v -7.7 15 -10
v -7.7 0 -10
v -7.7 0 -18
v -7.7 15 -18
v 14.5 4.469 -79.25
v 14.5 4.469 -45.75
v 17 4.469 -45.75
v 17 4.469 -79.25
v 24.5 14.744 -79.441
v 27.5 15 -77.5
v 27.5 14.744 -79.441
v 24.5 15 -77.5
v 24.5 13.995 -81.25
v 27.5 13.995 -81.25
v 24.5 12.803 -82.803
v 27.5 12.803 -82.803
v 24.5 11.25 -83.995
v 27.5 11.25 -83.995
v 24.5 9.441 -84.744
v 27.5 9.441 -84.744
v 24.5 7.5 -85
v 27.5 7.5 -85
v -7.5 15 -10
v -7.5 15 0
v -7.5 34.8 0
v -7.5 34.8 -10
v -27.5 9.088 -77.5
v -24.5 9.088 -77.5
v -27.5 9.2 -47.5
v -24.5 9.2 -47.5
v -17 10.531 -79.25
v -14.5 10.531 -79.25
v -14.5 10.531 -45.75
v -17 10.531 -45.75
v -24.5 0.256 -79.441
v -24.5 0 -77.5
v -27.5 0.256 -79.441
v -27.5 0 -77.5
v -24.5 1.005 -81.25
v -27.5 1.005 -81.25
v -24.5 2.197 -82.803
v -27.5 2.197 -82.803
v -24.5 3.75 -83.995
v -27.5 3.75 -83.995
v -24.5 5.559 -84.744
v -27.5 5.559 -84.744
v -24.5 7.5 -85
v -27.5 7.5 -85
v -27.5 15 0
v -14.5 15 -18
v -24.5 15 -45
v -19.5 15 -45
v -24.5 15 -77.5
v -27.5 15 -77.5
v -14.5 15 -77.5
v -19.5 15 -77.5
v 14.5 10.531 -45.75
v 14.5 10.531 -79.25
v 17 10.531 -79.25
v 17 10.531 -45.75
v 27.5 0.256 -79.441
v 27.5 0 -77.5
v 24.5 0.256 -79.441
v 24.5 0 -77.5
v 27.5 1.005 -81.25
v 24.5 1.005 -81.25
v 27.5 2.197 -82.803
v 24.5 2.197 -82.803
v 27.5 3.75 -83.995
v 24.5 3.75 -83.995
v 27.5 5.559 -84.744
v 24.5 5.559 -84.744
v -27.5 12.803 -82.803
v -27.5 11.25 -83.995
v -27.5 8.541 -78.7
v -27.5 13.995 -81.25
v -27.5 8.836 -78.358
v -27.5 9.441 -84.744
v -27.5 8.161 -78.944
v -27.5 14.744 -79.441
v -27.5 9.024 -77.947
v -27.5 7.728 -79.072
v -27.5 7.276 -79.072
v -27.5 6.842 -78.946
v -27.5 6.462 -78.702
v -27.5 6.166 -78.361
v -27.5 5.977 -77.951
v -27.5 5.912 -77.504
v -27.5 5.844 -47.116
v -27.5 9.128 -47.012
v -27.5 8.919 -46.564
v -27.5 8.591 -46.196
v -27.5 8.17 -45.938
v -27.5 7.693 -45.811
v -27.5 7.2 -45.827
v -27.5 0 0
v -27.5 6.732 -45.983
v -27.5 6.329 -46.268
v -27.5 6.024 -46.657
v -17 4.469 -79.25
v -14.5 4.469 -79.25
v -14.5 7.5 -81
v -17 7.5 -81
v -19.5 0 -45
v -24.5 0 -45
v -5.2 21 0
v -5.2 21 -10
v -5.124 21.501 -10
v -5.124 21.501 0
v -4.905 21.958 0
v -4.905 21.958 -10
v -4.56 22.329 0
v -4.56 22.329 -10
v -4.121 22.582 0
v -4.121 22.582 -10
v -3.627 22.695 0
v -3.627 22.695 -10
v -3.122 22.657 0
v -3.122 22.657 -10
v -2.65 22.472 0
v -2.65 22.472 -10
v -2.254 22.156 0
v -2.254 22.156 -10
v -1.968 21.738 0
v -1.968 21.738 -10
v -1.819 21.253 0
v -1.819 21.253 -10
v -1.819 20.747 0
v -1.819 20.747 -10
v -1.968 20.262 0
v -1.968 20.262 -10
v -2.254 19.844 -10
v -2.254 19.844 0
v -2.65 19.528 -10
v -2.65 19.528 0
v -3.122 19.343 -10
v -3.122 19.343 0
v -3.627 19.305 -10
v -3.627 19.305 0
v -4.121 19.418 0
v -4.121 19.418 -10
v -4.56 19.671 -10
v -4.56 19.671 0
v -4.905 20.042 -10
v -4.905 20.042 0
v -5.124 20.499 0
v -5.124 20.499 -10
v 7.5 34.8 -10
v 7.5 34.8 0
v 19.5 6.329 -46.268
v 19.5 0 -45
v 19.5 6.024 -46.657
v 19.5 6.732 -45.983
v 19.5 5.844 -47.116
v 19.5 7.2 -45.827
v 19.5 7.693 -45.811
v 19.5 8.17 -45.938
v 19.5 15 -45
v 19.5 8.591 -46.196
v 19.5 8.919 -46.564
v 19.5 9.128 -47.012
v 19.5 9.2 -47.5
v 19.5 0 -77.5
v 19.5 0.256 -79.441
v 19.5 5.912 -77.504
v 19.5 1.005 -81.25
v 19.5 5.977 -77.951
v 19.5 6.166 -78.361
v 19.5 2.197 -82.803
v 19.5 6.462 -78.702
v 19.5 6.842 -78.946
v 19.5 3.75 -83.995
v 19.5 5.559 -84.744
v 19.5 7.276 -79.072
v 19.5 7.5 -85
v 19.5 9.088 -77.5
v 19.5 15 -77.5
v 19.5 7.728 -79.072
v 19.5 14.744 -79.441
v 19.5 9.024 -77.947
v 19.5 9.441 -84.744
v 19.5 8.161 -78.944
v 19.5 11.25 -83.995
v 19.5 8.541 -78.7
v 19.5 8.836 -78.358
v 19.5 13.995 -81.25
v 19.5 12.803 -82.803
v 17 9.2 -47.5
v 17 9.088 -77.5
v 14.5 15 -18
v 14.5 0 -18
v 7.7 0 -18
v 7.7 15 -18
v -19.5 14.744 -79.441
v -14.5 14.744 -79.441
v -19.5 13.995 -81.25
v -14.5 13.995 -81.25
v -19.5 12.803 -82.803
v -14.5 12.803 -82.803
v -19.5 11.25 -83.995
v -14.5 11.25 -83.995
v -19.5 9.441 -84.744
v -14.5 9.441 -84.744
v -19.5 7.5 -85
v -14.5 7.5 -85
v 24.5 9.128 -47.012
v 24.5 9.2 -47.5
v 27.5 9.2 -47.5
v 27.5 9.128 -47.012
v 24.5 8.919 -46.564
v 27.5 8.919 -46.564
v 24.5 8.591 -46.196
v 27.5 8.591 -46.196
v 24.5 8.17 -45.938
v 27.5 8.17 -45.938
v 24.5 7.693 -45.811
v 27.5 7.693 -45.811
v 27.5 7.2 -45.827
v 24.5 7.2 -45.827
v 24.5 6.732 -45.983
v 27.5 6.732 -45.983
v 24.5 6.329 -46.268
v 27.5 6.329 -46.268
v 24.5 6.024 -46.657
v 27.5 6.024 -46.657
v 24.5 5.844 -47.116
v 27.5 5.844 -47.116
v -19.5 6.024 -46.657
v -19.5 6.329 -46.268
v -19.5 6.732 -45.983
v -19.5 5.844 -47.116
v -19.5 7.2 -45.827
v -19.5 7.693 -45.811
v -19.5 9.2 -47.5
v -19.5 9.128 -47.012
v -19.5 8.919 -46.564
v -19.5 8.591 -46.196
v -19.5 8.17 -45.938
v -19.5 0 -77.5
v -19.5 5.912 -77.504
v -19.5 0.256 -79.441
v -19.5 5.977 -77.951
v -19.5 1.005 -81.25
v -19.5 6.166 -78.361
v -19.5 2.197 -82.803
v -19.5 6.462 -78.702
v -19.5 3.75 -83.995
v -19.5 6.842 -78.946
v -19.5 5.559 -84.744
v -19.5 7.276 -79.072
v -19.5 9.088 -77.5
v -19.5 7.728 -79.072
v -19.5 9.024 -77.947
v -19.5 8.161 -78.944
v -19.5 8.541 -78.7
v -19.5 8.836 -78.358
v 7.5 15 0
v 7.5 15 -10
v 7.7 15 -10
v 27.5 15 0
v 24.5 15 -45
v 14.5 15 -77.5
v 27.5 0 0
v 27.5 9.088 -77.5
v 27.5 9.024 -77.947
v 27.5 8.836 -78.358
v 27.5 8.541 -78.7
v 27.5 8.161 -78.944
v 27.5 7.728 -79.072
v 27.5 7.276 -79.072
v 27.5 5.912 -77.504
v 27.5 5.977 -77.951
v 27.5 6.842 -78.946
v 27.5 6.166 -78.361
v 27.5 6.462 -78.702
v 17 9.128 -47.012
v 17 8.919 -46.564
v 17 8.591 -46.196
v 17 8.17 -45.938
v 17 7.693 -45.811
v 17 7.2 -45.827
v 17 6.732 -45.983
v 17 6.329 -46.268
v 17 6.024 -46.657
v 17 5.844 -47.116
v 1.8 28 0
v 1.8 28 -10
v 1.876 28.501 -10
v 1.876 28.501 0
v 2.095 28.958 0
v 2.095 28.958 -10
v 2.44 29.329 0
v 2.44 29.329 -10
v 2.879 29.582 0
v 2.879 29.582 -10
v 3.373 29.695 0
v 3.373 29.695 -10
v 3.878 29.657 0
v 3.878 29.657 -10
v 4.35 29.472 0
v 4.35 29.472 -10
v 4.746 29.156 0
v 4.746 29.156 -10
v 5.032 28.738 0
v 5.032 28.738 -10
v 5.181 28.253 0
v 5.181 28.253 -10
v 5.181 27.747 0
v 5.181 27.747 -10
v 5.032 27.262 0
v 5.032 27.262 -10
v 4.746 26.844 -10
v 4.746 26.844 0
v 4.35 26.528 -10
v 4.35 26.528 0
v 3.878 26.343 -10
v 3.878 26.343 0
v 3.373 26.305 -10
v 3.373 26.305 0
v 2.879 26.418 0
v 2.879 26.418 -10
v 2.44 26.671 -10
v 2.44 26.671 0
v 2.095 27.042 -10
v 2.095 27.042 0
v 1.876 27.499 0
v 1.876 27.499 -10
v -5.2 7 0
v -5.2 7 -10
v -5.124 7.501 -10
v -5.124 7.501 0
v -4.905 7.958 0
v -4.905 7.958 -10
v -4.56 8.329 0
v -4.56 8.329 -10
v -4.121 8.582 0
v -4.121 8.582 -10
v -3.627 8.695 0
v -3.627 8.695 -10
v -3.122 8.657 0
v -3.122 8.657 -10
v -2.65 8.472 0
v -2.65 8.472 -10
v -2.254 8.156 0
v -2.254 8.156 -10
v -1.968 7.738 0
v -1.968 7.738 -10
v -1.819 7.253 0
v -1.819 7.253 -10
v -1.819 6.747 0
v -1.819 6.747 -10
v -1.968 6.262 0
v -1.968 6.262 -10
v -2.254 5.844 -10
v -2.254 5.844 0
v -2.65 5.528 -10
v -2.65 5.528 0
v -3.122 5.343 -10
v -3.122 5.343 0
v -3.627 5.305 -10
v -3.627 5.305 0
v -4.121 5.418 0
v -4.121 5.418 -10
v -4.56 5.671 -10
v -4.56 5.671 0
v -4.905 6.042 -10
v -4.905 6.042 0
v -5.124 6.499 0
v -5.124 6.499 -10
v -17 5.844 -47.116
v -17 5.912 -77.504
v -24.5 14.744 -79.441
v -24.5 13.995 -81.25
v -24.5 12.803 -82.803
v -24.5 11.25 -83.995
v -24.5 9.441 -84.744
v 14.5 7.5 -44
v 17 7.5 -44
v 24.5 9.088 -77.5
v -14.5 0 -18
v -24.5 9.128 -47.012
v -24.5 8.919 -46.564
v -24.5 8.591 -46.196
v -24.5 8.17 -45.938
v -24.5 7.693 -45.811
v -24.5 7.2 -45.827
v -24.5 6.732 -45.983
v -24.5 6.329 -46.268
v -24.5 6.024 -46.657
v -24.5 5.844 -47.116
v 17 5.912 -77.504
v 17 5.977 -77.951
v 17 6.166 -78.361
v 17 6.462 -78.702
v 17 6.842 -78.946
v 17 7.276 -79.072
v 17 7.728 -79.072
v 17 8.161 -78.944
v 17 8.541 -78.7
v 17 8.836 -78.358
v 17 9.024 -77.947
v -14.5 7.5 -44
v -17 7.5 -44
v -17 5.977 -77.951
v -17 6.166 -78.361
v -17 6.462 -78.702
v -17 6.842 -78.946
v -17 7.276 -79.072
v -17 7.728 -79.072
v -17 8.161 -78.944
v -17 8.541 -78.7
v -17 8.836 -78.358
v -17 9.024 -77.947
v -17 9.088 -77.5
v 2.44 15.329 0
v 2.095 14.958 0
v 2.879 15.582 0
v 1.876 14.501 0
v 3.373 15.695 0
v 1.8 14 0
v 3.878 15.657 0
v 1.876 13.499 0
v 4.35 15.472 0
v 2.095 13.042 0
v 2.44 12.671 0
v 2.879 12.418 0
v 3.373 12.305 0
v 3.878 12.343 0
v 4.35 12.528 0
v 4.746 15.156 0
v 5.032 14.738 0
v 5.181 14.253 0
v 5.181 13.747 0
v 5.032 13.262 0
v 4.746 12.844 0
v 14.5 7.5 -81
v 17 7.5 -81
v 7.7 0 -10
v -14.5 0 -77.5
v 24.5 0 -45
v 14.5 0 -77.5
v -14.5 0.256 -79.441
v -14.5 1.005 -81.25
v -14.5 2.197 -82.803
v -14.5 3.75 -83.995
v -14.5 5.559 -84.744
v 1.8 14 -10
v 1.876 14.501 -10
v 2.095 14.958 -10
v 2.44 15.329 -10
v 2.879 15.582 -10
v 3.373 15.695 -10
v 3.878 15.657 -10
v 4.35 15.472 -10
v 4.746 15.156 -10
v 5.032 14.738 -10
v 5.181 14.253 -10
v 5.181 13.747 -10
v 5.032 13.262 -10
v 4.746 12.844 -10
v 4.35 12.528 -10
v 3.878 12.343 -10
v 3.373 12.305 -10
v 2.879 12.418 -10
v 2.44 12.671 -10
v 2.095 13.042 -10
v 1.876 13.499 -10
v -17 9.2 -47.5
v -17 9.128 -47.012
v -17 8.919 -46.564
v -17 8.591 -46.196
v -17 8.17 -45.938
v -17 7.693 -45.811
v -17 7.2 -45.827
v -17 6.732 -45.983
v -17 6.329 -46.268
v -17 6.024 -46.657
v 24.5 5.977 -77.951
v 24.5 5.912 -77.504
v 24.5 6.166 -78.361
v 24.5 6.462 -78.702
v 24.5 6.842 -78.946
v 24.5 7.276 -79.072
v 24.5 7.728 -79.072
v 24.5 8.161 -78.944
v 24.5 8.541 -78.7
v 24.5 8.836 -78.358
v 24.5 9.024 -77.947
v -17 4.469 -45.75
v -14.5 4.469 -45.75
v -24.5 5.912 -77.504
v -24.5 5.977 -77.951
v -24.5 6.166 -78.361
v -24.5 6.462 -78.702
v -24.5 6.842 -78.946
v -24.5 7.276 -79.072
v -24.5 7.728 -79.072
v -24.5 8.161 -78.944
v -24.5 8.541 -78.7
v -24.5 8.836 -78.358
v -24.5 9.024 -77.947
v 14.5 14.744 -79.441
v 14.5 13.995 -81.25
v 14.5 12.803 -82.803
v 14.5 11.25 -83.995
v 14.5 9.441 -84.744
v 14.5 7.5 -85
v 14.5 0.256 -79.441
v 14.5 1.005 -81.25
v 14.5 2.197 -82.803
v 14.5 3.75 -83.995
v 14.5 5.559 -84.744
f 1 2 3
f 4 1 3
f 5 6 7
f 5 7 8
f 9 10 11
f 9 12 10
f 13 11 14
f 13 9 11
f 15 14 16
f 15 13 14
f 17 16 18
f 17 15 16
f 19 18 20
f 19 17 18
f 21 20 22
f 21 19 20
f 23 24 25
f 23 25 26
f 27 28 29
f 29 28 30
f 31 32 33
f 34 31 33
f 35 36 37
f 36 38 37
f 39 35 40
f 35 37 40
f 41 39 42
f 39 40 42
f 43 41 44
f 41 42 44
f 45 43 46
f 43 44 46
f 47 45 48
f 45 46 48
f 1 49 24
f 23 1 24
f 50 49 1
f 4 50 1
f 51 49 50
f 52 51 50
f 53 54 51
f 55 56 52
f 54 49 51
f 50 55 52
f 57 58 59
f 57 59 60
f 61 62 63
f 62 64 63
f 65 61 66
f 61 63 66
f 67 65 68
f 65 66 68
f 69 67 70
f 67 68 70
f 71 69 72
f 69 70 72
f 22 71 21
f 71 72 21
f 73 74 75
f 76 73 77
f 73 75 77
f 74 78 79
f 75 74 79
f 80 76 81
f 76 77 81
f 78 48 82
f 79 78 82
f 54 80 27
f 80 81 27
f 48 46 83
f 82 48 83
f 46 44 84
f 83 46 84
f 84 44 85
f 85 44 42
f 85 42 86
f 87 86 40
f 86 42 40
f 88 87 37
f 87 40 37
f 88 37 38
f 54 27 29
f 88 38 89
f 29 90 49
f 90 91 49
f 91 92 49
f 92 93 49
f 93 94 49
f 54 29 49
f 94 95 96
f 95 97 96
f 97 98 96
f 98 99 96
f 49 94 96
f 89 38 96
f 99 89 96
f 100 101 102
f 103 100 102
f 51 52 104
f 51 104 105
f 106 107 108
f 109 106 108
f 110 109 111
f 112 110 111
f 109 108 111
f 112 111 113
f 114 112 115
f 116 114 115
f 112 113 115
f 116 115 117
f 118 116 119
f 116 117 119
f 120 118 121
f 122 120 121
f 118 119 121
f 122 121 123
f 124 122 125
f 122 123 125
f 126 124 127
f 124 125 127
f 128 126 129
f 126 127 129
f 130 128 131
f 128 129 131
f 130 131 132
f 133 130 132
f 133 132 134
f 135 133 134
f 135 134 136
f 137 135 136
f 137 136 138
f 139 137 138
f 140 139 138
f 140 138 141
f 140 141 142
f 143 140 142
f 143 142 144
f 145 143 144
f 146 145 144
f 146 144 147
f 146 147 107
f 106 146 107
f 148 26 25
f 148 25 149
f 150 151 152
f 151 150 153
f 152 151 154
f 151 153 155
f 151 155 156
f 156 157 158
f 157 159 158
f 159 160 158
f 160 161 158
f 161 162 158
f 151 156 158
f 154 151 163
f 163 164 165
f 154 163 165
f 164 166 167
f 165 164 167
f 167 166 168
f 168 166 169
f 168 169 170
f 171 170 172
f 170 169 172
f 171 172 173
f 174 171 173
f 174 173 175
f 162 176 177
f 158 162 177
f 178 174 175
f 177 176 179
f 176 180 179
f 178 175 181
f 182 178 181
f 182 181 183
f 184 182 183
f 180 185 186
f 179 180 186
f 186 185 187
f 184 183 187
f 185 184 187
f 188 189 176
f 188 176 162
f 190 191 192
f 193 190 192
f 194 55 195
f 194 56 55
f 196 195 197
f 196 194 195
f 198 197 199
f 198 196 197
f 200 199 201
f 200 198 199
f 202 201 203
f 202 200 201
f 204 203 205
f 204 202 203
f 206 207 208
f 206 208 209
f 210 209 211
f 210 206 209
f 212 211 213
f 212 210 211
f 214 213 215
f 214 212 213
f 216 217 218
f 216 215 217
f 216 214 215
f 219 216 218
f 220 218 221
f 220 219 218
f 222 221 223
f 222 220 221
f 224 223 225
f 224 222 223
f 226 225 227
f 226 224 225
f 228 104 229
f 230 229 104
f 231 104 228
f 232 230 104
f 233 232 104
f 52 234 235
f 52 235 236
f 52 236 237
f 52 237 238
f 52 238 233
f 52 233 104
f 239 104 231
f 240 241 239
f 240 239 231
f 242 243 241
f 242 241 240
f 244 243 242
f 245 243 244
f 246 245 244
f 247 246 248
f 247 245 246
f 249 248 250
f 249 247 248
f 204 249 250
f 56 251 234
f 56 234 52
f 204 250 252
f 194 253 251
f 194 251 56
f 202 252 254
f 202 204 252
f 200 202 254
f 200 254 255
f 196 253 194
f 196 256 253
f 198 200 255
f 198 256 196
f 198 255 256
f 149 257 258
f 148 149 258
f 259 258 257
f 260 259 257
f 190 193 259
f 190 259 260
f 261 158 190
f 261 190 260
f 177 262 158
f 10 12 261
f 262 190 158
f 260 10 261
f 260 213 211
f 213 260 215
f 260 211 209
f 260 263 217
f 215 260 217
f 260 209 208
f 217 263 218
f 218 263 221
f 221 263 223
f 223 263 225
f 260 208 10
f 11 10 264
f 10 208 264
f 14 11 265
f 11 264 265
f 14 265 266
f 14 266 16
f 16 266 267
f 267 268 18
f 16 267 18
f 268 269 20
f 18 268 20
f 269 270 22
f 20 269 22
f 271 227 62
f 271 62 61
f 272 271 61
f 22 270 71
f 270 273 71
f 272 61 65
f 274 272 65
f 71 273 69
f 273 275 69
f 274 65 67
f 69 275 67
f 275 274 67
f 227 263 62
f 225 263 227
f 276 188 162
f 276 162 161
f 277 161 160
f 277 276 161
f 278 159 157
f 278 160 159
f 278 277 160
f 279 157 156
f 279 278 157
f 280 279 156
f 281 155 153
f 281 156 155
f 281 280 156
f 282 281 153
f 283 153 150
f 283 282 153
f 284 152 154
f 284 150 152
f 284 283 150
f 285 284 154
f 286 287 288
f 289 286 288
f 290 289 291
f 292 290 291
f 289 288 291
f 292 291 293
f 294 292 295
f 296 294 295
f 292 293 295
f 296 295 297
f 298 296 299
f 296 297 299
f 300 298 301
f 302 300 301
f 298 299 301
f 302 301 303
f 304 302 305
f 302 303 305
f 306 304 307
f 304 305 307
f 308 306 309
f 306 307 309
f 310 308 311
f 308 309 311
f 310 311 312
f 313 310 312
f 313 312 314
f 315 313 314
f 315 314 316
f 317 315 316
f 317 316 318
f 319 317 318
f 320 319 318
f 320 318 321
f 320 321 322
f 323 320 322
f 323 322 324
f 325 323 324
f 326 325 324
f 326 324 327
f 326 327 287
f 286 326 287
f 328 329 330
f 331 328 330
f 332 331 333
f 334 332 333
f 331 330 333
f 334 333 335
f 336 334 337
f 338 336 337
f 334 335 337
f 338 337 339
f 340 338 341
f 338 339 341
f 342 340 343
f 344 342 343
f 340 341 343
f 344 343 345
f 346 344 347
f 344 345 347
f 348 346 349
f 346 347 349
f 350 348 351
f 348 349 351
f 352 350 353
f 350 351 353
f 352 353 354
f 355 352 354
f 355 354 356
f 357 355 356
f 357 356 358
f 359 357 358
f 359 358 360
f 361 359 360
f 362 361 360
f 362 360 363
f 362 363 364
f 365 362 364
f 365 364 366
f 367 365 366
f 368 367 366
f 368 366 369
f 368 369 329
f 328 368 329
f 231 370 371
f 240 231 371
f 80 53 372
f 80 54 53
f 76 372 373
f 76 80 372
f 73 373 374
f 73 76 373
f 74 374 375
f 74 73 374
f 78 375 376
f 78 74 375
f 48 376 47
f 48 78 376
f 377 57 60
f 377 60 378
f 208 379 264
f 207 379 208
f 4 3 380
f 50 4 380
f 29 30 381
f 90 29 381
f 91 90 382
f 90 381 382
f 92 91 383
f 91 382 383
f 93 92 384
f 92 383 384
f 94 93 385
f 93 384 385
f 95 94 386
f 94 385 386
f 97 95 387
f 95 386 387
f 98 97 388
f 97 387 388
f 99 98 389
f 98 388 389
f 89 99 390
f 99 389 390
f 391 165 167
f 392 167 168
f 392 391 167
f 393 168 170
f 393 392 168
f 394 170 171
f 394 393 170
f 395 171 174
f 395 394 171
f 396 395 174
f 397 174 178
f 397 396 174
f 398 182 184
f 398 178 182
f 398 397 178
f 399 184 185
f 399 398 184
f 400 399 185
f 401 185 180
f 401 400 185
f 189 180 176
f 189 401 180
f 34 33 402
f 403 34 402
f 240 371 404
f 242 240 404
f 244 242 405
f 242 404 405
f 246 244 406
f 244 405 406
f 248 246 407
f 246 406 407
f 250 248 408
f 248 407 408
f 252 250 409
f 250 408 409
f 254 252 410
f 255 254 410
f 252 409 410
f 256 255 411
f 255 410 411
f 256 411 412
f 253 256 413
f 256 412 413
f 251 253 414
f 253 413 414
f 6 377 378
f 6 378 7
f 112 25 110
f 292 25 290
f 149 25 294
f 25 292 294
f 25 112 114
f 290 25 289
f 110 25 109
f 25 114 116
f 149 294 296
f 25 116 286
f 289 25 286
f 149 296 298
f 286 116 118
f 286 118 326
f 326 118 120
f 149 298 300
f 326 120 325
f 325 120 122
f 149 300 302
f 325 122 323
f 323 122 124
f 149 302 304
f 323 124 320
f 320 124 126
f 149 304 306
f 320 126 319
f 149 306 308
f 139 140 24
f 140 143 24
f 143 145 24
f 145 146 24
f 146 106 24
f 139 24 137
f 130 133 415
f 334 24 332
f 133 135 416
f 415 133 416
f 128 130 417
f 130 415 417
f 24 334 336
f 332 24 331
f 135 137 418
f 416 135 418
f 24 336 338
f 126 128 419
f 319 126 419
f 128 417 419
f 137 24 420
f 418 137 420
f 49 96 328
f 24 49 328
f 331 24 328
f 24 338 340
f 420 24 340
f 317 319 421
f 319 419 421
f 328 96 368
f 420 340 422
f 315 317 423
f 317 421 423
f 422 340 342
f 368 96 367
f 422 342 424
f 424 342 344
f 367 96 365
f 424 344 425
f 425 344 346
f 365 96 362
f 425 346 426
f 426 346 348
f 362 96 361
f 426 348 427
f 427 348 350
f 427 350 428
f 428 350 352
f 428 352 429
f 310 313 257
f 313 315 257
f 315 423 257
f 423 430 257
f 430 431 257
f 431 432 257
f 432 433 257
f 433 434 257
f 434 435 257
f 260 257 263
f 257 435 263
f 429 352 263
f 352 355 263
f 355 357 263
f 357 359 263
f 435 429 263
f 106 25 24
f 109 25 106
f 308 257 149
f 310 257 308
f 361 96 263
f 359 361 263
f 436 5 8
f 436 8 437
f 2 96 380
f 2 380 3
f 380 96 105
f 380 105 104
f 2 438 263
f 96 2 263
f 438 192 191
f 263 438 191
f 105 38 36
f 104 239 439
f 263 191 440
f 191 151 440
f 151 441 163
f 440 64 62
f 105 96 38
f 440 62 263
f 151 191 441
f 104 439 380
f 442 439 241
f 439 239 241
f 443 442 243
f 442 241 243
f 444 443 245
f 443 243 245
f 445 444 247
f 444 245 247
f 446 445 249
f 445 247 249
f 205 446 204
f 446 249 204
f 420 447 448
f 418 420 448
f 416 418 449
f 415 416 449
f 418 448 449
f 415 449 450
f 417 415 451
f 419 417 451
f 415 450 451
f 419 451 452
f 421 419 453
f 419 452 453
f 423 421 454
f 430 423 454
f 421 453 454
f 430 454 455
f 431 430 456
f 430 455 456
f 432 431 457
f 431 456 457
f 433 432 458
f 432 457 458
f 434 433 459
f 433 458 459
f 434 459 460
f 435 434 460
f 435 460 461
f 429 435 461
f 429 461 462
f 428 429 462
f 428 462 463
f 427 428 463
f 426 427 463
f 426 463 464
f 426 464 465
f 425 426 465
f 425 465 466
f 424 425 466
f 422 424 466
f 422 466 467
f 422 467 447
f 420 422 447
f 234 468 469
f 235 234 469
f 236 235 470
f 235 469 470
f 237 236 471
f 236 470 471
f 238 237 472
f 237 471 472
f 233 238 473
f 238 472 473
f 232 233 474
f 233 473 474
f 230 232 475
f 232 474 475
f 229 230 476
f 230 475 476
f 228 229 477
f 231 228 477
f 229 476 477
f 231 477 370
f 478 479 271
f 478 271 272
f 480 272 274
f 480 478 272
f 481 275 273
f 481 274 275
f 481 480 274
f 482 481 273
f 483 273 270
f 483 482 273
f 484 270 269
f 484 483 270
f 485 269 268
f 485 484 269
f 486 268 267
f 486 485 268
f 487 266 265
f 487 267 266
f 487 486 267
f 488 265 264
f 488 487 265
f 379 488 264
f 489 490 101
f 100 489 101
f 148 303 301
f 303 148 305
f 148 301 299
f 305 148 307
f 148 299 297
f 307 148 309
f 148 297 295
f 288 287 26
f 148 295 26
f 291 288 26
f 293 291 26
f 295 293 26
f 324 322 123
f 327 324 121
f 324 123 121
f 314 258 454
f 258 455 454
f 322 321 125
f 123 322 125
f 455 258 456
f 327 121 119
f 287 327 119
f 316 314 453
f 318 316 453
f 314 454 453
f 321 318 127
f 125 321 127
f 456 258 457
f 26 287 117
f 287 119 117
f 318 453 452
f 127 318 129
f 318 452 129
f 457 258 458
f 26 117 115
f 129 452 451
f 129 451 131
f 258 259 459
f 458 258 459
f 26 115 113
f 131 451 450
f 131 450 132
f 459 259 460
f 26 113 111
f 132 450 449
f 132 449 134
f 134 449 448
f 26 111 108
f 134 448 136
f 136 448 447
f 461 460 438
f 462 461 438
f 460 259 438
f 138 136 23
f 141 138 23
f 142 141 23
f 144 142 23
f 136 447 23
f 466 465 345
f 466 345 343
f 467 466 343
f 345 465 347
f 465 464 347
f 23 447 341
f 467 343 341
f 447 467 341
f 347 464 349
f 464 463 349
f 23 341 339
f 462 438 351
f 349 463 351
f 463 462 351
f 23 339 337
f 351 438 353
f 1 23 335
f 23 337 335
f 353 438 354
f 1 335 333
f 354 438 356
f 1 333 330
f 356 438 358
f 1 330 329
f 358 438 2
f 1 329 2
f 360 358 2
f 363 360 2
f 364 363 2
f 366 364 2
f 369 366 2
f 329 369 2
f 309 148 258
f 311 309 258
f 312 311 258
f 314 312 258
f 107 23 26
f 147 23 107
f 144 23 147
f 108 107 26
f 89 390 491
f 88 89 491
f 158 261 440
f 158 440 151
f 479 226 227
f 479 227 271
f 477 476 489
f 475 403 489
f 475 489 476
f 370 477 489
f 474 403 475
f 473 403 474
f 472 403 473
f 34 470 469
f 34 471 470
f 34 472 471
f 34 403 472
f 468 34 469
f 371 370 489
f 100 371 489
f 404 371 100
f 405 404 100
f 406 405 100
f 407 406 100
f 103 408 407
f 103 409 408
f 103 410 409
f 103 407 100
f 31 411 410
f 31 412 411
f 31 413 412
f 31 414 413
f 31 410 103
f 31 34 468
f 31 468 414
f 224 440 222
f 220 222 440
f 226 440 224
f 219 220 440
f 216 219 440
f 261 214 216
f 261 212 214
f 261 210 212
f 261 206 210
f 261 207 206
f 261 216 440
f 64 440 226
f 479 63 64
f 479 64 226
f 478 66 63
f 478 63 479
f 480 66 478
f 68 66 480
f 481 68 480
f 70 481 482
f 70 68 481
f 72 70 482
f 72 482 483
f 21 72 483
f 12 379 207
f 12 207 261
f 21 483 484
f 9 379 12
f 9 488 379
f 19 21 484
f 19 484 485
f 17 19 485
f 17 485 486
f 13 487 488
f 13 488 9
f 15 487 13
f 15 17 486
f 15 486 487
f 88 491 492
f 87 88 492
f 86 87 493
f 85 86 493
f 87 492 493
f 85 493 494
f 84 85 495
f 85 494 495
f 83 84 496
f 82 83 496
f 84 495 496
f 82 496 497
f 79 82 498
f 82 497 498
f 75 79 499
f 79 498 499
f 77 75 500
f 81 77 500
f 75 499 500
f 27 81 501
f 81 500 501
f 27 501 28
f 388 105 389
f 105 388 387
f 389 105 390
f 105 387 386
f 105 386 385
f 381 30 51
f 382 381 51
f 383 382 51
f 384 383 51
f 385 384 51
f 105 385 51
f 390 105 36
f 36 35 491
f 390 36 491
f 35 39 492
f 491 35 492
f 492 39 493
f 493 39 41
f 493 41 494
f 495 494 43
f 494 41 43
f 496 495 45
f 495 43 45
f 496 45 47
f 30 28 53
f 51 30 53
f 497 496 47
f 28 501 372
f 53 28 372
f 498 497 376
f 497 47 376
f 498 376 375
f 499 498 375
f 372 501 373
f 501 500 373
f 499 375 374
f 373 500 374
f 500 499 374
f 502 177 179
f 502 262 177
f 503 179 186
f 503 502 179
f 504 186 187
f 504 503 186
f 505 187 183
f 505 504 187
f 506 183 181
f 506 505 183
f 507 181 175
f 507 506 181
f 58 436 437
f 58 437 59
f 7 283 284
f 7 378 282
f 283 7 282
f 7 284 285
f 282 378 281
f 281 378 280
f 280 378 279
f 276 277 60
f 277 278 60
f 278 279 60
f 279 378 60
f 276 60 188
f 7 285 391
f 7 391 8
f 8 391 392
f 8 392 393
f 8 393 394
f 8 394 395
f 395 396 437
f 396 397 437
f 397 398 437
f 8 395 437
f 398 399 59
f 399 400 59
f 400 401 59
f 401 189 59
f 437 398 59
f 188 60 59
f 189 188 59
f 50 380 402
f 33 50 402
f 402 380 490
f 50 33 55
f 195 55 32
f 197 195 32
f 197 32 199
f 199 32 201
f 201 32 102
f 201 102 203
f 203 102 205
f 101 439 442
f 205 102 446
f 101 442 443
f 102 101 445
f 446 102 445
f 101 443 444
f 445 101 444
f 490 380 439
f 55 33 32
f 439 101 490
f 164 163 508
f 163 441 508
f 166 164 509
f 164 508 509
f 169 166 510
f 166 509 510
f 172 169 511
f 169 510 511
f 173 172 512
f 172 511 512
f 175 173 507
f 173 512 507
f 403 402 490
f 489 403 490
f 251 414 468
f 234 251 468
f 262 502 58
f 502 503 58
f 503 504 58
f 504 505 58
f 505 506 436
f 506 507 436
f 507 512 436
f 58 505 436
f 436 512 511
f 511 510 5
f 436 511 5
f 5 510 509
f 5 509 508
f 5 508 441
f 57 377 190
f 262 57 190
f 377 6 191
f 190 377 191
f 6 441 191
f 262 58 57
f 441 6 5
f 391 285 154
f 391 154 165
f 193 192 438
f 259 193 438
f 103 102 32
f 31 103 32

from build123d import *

# Parameters (mm, degrees)
BOSS_EXTRUDE1_DEPTH = 15
SKETCH2_W           = 15
SKETCH2_H           = 10
BOSS_EXTRUDE2_DEPTH = 19.8
SKETCH3_W           = 5
SKETCH3_H           = 15
CUT_EXTRUDE1_DEPTH  = 40
CUT_EXTRUDE2_REACH  = 89.134
SKETCH4_R           = 1.7
LPATTERN1_COUNT     = 2
LPATTERN1_PITCH     = 14
CUT_EXTRUDE3_DEPTH  = 2.5
CUT_EXTRUDE4_DEPTH  = 15
FILLET1_R           = 7.5


with BuildPart() as part:
    # Sketch1 → Boss-Extrude1 (new body)
    with BuildSketch(Plane(origin=(0, 0, 0), x_dir=(1, 0, 0), z_dir=(0, 1, 0))):
        Polygon((-27.5, 0), (27.5, 0), (27.5, 85), (14.5, 85), (14.5, 18), (7.7, 18), (7.7, 10), (-7.7, 10), (-7.7, 18), (-14.5, 18), (-14.5, 85), (-27.5, 85), align=None)
    extrude(amount=BOSS_EXTRUDE1_DEPTH)

    # Sketch2 → Boss-Extrude2 (add)
    with BuildSketch(Plane(origin=(0, 15, 0), x_dir=(1, 0, 0), z_dir=(0, 1, 0))):
        with Locations((0, 5)):
            Rectangle(SKETCH2_W, SKETCH2_H)
    extrude(amount=BOSS_EXTRUDE2_DEPTH)

    # Sketch3 → Cut-Extrude1 (cut)
    with BuildSketch(Plane(origin=(0, 0, -85), x_dir=(-1, 0, 0), z_dir=(0, 0, -1))):
        with Locations((22, 7.5)):
            Rectangle(SKETCH3_W, SKETCH3_H)
        with Locations((-22, 7.5)):
            Rectangle(SKETCH3_W, SKETCH3_H)
    extrude(amount=-CUT_EXTRUDE1_DEPTH, mode=Mode.SUBTRACT)

    # Sketch4 → Cut-Extrude2 (cut, up to next)
    with BuildSketch(Plane(origin=(0, 0, -10), x_dir=(-1, 0, 0), z_dir=(0, 0, -1)), mode=Mode.PRIVATE) as cut_extrude2_sk1:
        with Locations((-3.5, 28)):
            Circle(SKETCH4_R)
    cut_extrude2_tool1 = extrude(cut_extrude2_sk1.sketch, amount=-CUT_EXTRUDE2_REACH, mode=Mode.PRIVATE) & part.part
    # Sketch4 → Cut-Extrude2 (cut, up to next)
    with BuildSketch(Plane(origin=(0, 0, -10), x_dir=(-1, 0, 0), z_dir=(0, 0, -1)), mode=Mode.PRIVATE) as cut_extrude2_sk2:
        with Locations((3.5, 21)):
            Circle(SKETCH4_R)
    cut_extrude2_tool2 = extrude(cut_extrude2_sk2.sketch, amount=-CUT_EXTRUDE2_REACH, mode=Mode.PRIVATE) & part.part
    cut_extrude2_1 = cut_extrude2_tool1.solids().sort_by_distance((3.5, 28, -10))[0]
    add(cut_extrude2_1, mode=Mode.SUBTRACT)
    cut_extrude2_2 = cut_extrude2_tool2.solids().sort_by_distance((-3.5, 21, -10))[0]
    add(cut_extrude2_2, mode=Mode.SUBTRACT)
    cut_extrude2 = cut_extrude2_1 + cut_extrude2_2  # Cut-Extrude2 as one shape, for the pattern or mirror that repeats it

    # LPattern1: Cut-Extrude2 ×2
    with Locations(*[(0, -i * LPATTERN1_PITCH, 0) for i in range(1, LPATTERN1_COUNT)]):
        add(cut_extrude2, mode=Mode.SUBTRACT)

    # Sketch5 → Cut-Extrude3 (cut)
    with BuildSketch(Plane.ZY.offset(-14.5)):
        Polygon((-79.25, 10.531088913), (-45.75, 10.531088913), (-44, 7.5), (-45.75, 4.468911087), (-79.25, 4.468911087), (-81, 7.5), align=None)
    cut_extrude3 = extrude(amount=-CUT_EXTRUDE3_DEPTH, mode=Mode.SUBTRACT)

    # Sketch6 → Cut-Extrude4 (cut)
    with BuildSketch(Plane.ZY.offset(-17)):
        with BuildLine():
            Line((-77.5, 9.088089066), (-47.5, 9.2))
            ThreePointArc((-47.5, 9.2), (-45.811011578, 7.693178963), (-47.116144669, 5.843903661))
            Line((-47.116144669, 5.843903661), (-77.503554355, 5.911914911))
            ThreePointArc((-77.503554355, 5.911914911), (-79.088088072, 7.501777179), (-77.5, 9.088089066))
        make_face()
    cut_extrude4 = extrude(amount=-CUT_EXTRUDE4_DEPTH, mode=Mode.SUBTRACT)

    # Mirror1: Cut-Extrude3, Cut-Extrude4 across plane
    add(cut_extrude3.mirror(Plane(origin=(0, 0, 0), x_dir=(0, 0, 1), z_dir=(1, 0, 0))), mode=Mode.SUBTRACT)
    add(cut_extrude4.mirror(Plane(origin=(0, 0, 0), x_dir=(0, 0, 1), z_dir=(1, 0, 0))), mode=Mode.SUBTRACT)

    # Fillet1
    fillet1_edges = [part.edges().sort_by_distance(p)[0] for p in [
        (26, 15, -85),
        (17, 15, -85),
        (-17, 15, -85),
        (-26, 15, -85),
        (26, 0, -85),
        (17, 0, -85),
        (-17, 0, -85),
        (-26, 0, -85),
    ]]
    fillet(fillet1_edges, radius=FILLET1_R - 0.0001)  # a hair under: the kernel refuses the full size


solid = part.part
